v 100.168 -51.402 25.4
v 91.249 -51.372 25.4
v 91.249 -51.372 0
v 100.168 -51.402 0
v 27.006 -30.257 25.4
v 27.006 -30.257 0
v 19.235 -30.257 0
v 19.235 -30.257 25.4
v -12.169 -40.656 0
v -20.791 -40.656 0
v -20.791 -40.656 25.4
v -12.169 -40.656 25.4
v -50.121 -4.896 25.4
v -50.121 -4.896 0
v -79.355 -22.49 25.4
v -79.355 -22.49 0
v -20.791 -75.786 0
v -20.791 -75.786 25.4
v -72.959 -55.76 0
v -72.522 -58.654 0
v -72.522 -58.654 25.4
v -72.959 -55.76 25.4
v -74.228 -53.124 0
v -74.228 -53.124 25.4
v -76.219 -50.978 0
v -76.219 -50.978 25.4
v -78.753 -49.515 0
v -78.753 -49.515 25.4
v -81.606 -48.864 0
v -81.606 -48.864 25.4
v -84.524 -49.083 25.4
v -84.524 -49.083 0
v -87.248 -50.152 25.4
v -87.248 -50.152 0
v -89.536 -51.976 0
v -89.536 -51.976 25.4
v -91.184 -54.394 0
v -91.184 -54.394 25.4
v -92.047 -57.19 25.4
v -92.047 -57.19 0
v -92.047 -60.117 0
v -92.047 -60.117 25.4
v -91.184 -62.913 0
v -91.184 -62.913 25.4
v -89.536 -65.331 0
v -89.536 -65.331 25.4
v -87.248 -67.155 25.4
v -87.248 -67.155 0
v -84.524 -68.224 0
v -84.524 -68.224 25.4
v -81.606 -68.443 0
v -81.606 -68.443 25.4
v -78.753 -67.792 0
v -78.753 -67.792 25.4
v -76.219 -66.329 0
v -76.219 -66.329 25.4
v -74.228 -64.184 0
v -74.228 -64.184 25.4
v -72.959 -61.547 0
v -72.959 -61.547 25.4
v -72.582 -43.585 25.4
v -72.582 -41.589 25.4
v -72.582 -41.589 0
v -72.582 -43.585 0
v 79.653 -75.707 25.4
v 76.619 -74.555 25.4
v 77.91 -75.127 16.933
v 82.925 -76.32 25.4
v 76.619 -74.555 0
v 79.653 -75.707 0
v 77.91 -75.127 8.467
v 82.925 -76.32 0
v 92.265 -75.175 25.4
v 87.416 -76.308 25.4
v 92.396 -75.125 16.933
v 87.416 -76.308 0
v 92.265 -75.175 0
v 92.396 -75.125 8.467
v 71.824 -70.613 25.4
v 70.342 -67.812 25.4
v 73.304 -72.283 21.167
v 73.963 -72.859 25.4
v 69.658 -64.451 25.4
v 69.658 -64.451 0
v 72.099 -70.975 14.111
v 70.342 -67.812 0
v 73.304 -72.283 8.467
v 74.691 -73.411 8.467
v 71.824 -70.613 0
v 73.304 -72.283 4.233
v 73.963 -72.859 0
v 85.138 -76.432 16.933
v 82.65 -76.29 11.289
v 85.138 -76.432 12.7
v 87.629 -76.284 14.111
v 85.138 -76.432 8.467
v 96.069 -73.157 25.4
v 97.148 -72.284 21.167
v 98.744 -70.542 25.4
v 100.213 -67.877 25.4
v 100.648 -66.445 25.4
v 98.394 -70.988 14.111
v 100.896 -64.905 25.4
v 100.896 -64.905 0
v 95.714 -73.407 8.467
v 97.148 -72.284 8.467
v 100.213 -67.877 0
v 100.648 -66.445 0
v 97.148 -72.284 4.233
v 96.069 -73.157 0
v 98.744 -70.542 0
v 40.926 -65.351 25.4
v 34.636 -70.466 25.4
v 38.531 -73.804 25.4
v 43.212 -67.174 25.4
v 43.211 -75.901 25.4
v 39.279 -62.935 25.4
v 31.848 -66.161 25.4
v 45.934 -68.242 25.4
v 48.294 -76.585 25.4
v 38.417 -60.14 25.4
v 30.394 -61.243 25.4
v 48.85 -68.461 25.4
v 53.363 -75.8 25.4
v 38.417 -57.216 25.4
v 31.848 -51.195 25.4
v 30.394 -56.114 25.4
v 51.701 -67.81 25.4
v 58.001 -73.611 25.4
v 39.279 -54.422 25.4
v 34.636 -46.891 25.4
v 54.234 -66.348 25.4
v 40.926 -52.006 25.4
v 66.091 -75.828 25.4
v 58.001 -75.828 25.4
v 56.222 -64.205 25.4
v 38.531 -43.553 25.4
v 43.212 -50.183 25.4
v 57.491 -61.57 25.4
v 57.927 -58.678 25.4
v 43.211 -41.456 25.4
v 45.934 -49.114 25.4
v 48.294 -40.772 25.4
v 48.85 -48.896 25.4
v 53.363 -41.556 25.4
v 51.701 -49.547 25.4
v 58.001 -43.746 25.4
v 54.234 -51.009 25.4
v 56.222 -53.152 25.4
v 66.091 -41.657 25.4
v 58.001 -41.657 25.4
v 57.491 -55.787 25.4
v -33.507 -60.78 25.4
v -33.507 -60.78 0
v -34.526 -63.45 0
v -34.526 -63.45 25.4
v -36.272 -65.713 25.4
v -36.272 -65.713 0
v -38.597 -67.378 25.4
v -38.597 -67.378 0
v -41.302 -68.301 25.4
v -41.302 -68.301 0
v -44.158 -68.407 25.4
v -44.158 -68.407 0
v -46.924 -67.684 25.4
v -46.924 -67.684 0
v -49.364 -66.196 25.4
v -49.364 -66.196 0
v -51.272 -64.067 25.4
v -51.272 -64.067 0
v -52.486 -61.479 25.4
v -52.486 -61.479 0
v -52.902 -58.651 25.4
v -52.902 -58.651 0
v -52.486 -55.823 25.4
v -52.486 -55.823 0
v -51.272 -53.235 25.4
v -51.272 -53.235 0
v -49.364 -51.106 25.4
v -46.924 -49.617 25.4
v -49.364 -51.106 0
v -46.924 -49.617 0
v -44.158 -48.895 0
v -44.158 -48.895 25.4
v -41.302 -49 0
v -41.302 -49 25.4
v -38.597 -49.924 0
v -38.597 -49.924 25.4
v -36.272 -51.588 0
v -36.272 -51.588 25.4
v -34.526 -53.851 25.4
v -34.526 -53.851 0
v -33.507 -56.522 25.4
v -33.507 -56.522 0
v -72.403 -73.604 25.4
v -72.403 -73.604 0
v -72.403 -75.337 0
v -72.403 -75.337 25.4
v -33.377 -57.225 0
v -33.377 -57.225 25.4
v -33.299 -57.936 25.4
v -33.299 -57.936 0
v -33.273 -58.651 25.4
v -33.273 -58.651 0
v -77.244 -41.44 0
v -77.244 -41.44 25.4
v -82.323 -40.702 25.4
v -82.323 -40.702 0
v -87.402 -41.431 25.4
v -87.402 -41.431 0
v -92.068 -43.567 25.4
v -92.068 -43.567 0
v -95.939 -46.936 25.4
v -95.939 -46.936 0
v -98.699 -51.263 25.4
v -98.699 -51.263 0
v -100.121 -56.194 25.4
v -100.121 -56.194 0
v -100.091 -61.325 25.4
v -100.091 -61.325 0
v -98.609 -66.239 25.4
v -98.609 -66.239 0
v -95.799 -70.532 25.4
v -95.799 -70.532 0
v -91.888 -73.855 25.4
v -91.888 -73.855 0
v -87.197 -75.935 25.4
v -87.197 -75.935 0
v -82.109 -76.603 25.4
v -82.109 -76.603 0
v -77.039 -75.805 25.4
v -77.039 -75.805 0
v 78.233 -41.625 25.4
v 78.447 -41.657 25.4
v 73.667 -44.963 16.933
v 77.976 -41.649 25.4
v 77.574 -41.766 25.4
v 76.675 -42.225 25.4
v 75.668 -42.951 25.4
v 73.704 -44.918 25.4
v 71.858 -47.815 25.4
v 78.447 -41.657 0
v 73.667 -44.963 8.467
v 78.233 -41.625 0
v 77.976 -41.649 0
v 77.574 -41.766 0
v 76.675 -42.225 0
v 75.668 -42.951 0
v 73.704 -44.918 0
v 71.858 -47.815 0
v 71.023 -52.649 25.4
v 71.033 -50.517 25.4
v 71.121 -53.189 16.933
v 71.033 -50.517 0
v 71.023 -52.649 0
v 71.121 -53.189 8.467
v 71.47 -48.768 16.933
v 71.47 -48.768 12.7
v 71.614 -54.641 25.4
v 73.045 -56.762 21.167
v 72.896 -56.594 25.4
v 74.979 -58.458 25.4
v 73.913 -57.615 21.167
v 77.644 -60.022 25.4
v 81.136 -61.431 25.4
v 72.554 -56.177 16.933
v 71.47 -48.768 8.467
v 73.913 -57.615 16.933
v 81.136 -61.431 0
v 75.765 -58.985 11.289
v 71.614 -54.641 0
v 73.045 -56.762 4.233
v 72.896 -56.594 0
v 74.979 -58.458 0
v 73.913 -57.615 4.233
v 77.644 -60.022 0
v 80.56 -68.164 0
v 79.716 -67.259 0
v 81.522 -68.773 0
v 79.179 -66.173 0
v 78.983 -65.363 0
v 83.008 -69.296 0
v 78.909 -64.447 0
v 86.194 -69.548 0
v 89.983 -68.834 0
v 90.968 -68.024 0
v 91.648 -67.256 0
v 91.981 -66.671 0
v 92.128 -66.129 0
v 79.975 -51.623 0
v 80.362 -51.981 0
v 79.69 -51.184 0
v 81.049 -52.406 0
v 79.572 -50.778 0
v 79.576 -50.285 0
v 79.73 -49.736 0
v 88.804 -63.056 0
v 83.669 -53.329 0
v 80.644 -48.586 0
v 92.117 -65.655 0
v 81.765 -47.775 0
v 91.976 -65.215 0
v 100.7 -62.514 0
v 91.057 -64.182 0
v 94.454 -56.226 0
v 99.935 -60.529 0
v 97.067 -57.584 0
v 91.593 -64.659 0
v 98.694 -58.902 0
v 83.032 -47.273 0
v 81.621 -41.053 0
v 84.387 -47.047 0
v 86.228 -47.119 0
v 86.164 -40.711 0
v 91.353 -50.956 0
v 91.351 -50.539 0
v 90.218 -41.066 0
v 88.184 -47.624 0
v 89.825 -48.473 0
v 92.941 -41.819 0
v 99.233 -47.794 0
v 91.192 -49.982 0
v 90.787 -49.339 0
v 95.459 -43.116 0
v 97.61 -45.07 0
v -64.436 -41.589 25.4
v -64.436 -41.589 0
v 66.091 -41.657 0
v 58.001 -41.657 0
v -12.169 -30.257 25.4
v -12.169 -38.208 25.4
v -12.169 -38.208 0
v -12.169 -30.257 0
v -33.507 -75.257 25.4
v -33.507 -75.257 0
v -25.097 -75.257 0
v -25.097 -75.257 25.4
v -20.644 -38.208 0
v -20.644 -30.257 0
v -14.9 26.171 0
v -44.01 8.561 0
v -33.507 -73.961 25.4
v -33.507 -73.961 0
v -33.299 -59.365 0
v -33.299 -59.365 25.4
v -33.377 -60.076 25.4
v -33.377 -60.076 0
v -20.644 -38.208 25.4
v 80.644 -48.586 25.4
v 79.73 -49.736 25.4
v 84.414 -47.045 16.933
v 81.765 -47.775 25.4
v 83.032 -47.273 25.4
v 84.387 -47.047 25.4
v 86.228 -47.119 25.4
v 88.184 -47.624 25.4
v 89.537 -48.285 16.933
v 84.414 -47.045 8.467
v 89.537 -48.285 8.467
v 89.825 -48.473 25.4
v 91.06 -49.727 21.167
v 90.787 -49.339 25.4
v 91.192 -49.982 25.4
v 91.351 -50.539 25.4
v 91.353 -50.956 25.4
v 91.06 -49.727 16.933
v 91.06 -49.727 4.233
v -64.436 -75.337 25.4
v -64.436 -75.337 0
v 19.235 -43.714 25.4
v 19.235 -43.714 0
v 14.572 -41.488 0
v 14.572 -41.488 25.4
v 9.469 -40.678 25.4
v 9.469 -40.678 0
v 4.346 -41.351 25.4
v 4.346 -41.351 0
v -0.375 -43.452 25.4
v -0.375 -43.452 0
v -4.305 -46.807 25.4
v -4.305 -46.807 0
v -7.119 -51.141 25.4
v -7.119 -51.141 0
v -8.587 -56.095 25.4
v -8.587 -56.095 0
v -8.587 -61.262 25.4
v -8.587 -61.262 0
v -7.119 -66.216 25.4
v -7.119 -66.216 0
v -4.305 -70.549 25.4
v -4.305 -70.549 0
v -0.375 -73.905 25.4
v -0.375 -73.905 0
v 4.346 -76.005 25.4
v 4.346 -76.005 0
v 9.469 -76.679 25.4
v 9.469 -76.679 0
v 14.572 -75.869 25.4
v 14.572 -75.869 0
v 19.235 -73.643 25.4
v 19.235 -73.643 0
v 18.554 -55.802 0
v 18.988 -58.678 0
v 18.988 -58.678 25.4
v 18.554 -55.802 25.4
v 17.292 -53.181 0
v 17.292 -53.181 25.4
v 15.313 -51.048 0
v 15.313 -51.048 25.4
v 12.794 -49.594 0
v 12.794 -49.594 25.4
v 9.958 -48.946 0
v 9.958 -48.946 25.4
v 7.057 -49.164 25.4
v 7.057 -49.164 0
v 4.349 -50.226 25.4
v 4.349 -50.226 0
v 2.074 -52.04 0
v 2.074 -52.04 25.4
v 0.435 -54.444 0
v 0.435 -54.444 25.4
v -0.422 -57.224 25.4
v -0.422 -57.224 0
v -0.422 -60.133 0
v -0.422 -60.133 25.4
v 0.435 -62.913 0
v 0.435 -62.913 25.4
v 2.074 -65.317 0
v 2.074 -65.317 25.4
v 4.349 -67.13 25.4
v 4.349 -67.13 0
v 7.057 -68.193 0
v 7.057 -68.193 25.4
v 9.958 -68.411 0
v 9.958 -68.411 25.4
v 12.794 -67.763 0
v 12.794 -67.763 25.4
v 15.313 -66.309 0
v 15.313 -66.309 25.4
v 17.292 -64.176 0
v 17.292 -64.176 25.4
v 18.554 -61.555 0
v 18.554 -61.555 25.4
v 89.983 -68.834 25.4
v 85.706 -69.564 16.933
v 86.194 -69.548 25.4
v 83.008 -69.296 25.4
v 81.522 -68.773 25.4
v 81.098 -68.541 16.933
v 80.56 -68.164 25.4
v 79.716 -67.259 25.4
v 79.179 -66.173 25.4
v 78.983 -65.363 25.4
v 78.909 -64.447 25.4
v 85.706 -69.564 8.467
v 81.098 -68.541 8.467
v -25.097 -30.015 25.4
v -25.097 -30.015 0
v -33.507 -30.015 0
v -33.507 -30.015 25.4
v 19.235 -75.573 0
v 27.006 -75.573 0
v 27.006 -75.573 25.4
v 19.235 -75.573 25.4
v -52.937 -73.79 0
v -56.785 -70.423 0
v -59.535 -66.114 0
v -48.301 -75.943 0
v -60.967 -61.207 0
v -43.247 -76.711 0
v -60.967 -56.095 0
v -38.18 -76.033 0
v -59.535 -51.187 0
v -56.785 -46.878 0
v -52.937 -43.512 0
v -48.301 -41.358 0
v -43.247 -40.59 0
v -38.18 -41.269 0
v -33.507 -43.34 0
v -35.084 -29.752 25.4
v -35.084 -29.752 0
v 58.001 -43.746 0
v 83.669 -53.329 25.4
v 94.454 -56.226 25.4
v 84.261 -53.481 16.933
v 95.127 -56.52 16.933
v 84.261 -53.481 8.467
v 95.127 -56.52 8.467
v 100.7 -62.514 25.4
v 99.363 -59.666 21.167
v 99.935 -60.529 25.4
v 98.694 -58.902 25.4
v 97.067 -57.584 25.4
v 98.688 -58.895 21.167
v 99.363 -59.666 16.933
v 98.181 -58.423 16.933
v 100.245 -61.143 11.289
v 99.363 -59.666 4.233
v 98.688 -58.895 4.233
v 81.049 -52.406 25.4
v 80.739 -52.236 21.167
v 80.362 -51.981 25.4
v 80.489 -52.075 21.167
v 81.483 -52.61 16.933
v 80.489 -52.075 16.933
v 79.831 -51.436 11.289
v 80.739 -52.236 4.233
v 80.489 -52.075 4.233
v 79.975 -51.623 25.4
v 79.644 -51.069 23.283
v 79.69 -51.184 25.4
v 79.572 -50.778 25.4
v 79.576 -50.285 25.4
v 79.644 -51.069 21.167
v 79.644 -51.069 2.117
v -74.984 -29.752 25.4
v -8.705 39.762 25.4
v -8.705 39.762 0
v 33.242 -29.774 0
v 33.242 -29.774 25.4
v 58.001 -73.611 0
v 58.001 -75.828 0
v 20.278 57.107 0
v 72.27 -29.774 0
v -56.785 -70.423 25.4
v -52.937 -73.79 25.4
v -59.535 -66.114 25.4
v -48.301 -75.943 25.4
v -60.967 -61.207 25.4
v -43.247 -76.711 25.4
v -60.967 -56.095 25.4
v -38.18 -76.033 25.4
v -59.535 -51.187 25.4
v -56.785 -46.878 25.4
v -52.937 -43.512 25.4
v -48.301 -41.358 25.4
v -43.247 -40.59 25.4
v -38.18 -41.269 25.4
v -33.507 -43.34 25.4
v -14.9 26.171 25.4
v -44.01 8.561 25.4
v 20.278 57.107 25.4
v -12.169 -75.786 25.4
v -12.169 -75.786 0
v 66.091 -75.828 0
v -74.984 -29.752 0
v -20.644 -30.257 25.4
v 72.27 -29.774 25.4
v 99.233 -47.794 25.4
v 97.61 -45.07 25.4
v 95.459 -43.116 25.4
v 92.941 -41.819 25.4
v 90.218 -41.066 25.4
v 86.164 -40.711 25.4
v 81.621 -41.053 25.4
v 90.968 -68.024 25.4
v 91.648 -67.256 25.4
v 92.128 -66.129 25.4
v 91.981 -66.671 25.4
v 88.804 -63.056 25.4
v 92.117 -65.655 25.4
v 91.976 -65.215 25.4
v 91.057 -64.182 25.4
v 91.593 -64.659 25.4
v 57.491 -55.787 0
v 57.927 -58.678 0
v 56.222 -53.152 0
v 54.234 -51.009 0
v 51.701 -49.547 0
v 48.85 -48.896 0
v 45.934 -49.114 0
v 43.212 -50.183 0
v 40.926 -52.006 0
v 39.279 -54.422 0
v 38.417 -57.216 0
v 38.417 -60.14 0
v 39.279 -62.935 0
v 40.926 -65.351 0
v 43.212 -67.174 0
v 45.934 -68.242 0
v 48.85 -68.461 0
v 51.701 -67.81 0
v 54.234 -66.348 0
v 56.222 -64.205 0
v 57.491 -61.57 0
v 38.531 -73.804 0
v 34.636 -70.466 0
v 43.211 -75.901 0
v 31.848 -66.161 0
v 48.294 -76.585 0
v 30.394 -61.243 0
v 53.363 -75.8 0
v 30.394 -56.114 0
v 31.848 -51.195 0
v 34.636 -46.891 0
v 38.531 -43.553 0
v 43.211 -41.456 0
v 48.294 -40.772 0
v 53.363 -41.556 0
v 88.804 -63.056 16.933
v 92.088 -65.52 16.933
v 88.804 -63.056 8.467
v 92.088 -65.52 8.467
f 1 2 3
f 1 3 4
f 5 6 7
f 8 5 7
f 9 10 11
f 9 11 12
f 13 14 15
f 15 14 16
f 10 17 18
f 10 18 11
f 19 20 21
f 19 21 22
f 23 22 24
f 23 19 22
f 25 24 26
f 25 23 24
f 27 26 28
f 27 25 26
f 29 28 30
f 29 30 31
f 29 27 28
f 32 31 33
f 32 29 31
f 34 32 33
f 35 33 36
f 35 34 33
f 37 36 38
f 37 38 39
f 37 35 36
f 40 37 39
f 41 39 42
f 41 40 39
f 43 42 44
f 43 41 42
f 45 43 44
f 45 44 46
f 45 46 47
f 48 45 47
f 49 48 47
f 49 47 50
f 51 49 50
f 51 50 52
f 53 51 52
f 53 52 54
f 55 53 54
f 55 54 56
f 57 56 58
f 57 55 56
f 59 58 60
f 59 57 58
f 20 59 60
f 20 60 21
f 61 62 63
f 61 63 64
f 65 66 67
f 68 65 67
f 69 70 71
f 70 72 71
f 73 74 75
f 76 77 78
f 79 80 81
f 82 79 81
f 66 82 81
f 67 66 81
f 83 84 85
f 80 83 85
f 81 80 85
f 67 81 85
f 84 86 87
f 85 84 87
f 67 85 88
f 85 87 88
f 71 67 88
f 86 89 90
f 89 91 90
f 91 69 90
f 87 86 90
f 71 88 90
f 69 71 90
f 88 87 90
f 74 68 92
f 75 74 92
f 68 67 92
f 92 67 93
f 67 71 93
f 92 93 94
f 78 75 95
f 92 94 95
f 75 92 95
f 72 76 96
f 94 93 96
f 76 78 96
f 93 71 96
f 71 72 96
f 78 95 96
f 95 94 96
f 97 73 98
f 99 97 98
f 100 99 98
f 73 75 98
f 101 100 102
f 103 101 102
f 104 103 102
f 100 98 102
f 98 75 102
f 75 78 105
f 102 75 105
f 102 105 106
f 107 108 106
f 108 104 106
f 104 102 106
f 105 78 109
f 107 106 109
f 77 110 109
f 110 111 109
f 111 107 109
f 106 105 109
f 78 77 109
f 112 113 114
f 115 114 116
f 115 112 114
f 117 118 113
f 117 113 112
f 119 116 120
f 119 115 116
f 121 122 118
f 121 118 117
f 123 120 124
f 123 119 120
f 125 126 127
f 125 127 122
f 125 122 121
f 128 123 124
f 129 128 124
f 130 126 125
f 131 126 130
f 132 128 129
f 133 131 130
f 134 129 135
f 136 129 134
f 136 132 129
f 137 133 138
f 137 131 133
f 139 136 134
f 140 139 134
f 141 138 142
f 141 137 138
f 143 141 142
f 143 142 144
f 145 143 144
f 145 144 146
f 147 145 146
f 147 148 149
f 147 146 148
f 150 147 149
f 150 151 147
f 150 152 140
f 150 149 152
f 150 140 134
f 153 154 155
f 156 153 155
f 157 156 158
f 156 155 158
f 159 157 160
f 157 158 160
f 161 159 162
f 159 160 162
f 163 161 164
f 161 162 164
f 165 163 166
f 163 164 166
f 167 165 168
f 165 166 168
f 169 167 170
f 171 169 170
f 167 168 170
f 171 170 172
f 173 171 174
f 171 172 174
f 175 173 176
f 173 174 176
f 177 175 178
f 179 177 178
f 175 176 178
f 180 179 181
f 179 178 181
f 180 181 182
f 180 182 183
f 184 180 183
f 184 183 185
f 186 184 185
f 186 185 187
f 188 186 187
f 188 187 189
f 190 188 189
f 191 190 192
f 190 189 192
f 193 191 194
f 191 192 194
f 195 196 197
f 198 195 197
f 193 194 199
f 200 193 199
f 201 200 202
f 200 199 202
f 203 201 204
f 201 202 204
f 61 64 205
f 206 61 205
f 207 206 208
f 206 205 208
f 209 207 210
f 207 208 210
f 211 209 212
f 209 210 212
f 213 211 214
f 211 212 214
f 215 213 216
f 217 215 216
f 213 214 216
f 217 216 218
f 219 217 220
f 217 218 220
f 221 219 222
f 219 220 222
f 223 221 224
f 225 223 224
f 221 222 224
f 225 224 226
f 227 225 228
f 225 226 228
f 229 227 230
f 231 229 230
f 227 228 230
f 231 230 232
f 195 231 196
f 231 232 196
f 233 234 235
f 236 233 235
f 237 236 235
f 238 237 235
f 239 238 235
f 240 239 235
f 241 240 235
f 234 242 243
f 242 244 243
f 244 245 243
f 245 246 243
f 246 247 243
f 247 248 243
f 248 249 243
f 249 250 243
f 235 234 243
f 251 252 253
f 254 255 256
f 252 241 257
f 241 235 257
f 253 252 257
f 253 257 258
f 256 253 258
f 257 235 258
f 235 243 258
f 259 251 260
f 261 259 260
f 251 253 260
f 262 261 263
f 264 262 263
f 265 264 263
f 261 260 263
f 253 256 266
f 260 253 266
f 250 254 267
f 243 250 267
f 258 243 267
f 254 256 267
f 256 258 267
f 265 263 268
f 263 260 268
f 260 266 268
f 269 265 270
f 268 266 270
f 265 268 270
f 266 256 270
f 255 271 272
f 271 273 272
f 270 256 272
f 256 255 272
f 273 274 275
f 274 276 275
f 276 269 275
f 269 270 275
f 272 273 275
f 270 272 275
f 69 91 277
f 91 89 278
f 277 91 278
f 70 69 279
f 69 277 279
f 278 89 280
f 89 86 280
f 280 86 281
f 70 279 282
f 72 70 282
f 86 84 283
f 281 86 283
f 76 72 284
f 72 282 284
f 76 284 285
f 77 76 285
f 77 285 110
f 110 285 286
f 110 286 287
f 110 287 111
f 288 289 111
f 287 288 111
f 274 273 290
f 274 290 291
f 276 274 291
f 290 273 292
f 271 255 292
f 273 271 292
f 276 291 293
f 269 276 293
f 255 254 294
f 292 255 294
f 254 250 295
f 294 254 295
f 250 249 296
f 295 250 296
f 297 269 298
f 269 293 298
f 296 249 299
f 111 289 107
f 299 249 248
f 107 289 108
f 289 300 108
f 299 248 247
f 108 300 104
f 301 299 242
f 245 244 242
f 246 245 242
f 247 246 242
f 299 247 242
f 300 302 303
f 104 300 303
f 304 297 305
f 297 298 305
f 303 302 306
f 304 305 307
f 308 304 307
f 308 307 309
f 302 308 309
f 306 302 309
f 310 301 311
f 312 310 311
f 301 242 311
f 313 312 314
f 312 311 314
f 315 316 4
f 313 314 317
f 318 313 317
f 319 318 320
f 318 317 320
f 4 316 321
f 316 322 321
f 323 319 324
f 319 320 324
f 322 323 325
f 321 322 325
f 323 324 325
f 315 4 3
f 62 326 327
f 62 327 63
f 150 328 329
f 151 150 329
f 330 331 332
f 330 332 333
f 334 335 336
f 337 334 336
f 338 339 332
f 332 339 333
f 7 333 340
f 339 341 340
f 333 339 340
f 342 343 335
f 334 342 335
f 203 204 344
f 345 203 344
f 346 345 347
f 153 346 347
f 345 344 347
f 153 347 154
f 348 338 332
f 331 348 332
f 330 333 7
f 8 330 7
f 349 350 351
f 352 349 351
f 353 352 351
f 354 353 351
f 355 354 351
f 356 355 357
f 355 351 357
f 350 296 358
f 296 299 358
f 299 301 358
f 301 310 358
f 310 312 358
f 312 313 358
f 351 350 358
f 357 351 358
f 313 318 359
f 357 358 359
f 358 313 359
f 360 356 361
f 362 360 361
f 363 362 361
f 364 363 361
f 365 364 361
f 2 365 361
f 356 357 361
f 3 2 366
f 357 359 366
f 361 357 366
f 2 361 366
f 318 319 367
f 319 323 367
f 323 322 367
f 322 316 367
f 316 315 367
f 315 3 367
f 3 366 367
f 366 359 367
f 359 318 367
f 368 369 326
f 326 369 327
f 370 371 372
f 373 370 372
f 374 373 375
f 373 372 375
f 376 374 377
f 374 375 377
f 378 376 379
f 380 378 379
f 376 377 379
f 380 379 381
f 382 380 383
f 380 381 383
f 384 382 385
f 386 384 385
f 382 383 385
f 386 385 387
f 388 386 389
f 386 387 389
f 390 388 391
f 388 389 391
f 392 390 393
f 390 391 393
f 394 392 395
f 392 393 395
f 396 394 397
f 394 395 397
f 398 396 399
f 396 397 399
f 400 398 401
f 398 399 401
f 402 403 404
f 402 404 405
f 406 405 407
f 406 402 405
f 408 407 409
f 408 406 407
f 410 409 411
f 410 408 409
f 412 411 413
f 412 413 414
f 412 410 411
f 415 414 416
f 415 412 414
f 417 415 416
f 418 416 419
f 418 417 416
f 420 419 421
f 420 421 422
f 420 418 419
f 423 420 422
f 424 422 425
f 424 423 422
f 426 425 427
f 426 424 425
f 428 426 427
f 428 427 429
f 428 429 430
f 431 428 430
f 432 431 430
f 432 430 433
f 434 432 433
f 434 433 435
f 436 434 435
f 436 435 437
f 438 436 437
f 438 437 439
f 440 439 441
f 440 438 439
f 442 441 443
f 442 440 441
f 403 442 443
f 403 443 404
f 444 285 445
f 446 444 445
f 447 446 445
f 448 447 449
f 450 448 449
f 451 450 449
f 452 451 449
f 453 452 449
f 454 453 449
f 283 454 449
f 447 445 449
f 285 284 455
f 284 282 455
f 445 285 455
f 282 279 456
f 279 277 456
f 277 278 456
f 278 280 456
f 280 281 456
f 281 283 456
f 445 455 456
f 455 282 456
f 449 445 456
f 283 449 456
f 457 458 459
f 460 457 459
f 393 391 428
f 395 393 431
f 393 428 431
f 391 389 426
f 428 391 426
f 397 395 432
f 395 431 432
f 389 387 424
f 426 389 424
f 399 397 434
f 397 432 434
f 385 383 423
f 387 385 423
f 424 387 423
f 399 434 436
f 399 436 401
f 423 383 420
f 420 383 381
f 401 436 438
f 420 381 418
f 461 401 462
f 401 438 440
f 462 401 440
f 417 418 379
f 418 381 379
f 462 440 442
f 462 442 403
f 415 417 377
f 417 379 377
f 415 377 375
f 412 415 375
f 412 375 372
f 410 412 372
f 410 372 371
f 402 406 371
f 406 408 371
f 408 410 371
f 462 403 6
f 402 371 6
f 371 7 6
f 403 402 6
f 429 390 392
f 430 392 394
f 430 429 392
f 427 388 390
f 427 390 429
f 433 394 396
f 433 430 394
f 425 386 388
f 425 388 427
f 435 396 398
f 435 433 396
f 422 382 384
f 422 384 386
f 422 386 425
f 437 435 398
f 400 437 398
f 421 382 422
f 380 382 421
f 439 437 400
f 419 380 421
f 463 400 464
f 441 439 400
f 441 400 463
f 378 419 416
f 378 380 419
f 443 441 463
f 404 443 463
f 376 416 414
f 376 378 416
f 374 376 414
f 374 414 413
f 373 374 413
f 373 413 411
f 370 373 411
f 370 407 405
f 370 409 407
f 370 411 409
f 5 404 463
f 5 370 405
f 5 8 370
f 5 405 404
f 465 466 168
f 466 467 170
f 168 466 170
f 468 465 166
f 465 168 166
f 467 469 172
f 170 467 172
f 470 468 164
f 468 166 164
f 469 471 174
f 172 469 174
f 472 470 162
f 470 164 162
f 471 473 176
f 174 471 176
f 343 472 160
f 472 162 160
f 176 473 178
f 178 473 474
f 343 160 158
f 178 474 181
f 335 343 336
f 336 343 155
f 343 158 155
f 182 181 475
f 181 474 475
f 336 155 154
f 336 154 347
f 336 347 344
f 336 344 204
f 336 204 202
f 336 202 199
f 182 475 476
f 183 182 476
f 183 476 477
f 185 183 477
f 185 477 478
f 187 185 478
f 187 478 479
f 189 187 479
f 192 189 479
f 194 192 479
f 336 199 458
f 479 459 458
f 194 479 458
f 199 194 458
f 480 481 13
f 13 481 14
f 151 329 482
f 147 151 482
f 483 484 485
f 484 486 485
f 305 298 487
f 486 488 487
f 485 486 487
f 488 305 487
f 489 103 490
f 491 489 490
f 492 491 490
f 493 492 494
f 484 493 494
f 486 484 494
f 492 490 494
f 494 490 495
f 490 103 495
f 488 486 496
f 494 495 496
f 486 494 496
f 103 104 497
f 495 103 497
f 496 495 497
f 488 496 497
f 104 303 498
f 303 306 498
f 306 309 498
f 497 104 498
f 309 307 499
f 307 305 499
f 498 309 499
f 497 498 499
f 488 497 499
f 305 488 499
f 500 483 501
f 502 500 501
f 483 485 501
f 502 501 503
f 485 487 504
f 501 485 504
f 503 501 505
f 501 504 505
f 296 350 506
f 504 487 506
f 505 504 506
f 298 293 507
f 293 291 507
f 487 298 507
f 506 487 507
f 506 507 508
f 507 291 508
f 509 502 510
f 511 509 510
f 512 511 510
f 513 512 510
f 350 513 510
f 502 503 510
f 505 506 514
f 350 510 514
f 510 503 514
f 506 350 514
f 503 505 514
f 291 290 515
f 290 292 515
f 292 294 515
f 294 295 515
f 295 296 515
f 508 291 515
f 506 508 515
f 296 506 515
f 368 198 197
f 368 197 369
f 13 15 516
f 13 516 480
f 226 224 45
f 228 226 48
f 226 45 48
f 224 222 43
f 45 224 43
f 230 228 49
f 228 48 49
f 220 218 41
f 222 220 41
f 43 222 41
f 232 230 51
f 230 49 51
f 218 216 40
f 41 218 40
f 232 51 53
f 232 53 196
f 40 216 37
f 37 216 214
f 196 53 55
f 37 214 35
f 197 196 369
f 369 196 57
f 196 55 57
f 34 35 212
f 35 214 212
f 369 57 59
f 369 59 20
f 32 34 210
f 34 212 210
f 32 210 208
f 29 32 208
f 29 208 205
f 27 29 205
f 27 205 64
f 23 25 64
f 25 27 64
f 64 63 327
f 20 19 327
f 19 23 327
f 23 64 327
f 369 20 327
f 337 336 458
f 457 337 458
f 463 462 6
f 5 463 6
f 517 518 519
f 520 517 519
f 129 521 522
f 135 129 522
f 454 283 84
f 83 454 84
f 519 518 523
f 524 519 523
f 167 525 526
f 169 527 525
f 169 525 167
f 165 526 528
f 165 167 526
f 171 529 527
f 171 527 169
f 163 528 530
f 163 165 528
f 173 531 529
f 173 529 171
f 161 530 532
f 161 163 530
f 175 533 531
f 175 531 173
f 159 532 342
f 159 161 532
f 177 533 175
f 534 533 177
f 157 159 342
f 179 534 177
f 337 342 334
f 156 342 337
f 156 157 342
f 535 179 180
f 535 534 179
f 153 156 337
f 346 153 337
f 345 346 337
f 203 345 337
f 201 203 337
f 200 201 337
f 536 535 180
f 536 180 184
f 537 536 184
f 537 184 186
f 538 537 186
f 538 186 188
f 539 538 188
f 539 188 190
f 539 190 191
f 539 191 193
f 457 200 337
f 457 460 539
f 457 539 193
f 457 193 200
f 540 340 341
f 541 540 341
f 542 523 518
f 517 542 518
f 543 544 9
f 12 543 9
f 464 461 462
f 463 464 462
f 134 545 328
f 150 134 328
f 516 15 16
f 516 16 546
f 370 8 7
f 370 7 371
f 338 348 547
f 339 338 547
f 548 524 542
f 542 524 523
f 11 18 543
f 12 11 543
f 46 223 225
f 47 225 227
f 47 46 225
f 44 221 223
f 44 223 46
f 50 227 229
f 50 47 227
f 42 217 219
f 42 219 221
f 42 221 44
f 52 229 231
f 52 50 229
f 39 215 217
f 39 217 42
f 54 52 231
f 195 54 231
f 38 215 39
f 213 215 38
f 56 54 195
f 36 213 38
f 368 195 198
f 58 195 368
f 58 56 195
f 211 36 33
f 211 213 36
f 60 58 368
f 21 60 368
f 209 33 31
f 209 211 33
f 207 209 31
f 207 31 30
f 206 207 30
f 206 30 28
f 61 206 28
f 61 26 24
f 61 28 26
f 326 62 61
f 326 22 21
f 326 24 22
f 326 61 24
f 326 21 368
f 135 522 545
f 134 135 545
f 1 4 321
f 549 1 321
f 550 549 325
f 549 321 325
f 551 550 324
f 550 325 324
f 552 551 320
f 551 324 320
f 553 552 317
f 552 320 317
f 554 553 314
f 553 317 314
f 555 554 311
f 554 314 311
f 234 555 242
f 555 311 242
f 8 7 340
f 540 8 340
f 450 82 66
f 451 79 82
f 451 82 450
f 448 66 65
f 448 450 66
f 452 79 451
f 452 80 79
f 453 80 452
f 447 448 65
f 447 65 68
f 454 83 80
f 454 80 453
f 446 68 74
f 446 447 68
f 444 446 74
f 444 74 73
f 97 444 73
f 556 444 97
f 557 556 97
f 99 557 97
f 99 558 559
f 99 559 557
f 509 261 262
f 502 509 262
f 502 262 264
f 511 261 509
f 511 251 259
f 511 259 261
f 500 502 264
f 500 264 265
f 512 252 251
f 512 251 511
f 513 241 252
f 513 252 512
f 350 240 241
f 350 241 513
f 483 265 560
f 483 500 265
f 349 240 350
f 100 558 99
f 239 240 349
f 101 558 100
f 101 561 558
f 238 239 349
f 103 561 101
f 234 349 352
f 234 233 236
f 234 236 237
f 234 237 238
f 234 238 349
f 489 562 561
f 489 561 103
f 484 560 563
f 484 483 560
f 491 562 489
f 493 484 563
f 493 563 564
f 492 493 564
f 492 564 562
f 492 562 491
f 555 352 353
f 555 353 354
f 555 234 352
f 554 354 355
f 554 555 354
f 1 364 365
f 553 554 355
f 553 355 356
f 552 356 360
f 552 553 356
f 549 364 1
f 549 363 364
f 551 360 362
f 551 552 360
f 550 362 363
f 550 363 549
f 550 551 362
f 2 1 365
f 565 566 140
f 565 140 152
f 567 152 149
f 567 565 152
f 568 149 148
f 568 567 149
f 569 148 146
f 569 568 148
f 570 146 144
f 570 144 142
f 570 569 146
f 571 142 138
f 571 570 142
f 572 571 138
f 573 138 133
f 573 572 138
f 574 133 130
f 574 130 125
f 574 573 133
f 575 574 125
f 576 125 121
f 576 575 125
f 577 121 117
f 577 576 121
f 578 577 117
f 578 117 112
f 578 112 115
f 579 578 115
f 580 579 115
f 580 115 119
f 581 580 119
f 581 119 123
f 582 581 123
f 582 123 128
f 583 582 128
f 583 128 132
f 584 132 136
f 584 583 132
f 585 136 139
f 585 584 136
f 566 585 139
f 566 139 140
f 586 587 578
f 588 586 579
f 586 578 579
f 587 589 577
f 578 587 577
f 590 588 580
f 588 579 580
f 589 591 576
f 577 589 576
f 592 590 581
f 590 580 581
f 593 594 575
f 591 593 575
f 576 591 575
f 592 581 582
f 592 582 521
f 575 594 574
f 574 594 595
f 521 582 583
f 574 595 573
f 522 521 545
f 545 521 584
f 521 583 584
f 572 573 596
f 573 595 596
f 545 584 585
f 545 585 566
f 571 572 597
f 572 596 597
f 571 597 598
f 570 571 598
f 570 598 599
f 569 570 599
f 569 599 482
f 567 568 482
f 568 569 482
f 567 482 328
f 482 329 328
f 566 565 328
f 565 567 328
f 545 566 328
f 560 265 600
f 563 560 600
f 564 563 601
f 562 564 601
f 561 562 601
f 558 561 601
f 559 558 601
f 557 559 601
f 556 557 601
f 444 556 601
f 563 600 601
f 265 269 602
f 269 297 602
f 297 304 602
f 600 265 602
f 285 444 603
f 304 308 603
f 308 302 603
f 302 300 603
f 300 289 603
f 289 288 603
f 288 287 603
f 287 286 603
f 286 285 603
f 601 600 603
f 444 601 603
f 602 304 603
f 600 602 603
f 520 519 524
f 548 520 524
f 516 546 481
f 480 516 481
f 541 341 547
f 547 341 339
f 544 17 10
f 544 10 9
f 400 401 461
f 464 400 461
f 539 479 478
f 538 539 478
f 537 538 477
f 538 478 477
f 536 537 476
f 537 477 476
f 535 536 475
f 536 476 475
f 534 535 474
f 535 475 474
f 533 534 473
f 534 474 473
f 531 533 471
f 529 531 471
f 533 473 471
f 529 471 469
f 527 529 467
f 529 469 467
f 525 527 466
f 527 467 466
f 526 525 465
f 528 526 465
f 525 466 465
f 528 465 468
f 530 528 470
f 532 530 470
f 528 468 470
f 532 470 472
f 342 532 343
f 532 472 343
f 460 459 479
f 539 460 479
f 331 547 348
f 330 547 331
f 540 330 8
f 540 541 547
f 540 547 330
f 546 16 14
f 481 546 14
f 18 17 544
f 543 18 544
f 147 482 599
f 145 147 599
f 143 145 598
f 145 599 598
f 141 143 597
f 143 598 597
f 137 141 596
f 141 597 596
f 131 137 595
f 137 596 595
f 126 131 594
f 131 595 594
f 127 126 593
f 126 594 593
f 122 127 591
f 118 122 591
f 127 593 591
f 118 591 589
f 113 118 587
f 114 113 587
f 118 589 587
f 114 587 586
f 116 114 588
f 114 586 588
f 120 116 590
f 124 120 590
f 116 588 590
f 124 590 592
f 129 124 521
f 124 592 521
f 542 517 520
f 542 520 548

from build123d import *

# Parameters (mm, degrees)
F0_R     = 9.8168583777
F1_DEPTH = 25.4
F0_W     = 8.6227245629
F0_H     = 35.1296216249
F0_W_2   = 8.4749514465
F0_H_2   = 7.9514212463
F0_R_2   = 9.7595146702
F0_R_3   = 9.8100166277


with BuildPart() as f1:
    # F0 (on Top) → F1 (new body)
    with BuildSketch(Plane.XY):
        with BuildLine():
            ThreePointArc((-64.4362494349, -57.3380434245), (-66.8940964115, -49.5050308039), (-72.5822299719, -43.5853825816))
            ThreePointArc((-72.5822299719, -43.5853825816), (-100.2904067139, -58.7606290674), (-72.4031999707, -73.6043100237))
            ThreePointArc((-72.4031999707, -73.6043100237), (-66.8398110404, -67.709835531), (-64.4362494349, -59.9690979987))
            Line((-64.4362494349, -59.9690979987), (-64.4362494349, -57.3380434245))
        make_face()
        with Locations((-82.3393538594, -58.6535707116)):
            Circle(F0_R, mode=Mode.SUBTRACT)
        with BuildLine():
            Line((-72.5822299719, -41.5889546275), (-72.5822299719, -43.5853825816))
            ThreePointArc((-72.5822299719, -43.5853825816), (-66.8940964115, -49.5050308039), (-64.4362494349, -57.3380434245))
            Line((-64.4362494349, -57.3380434245), (-64.4362494349, -41.5889546275))
            Line((-64.4362494349, -41.5889546275), (-72.5822299719, -41.5889546275))
        make_face()
        with BuildLine():
            ThreePointArc((-64.4362494349, -59.9690979987), (-66.8398110404, -67.709835531), (-72.4031999707, -73.6043100237))
            Line((-72.4031999707, -73.6043100237), (-72.4031999707, -75.3365829587))
            Line((-72.4031999707, -75.3365829587), (-64.4362494349, -75.3365829587))
            Line((-64.4362494349, -75.3365829587), (-64.4362494349, -59.9690979987))
        make_face()
    extrude(amount=F1_DEPTH)


with BuildPart() as f1b:
    # F0 (on Top) → F1, piece 2 (new body)
    with BuildSketch(Plane.XY):
        with BuildLine():
            ThreePointArc((-33.5065610707, -60.7797522098), (-52.9018863457, -58.6506798863), (-33.5065610707, -56.5216075629))
            Line((-33.5065610707, -56.5216075629), (-33.5065610707, -43.33988514))
            ThreePointArc((-33.5065610707, -43.33988514), (-61.1487145763, -58.6506798863), (-33.5065610707, -73.9614746327))
            Line((-33.5065610707, -73.9614746327), (-33.5065610707, -60.7797522098))
        make_face()
        with BuildLine():
            ThreePointArc((-33.5065610707, -56.5216075629), (-33.3314509237, -57.5797491056), (-33.2728475911, -58.6506798863))
            ThreePointArc((-33.2728475911, -58.6506798863), (-33.3314509237, -59.7216106671), (-33.5065610707, -60.7797522098))
            Line((-33.5065610707, -60.7797522098), (-33.5065610707, -73.9614746327))
            ThreePointArc((-33.5065610707, -73.9614746327), (-27.6904736277, -68.0924992486), (-25.0967442989, -60.2474808693))
            Line((-25.0967442989, -60.2474808693), (-25.0967442989, -57.0538789034))
            ThreePointArc((-25.0967442989, -57.0538789034), (-27.6904736277, -49.2088605241), (-33.5065610707, -43.33988514))
            Line((-33.5065610707, -43.33988514), (-33.5065610707, -56.5216075629))
        make_face()
        with BuildLine():
            Line((-33.5065610707, -30.0147216767), (-33.5065610707, -43.33988514))
            ThreePointArc((-33.5065610707, -43.33988514), (-27.6904736277, -49.2088605241), (-25.0967442989, -57.0538789034))
            Line((-25.0967442989, -57.0538789034), (-25.0967442989, -30.0147216767))
            Line((-25.0967442989, -30.0147216767), (-33.5065610707, -30.0147216767))
        make_face()
        with BuildLine():
            ThreePointArc((-25.0967442989, -60.2474808693), (-27.6904736277, -68.0924992486), (-33.5065610707, -73.9614746327))
            Line((-33.5065610707, -73.9614746327), (-33.5065610707, -75.2574056387))
            Line((-33.5065610707, -75.2574056387), (-25.0967442989, -75.2574056387))
            Line((-25.0967442989, -75.2574056387), (-25.0967442989, -60.2474808693))
        make_face()
    extrude(amount=F1_DEPTH)


with BuildPart() as f1c:
    # F0 (on Top) → F1, piece 3 (new body)
    with BuildSketch(Plane.XY):
        with Locations((-16.4800006896, -58.2212135196)):
            Rectangle(F0_W, F0_H)
    extrude(amount=F1_DEPTH)


with BuildPart() as f1d:
    # F0 (on Top) → F1, piece 4 (new body)
    with BuildSketch(Plane.XY):
        with Locations((-16.4061141315, -34.232267387)):
            Rectangle(F0_W_2, F0_H_2)
        Polygon((-14.9002628893, 26.1708135426), (-44.0099721158, 8.5610841344), (-20.6435898547, -30.2565567639), (-12.1686384082, -30.2565567639), (19.2351080477, -30.2565567639), align=None)
    extrude(amount=F1_DEPTH)


with BuildPart() as f1e:
    # F0 (on Top) → F1, piece 5 (new body)
    with BuildSketch(Plane.XY):
        with BuildLine():
            Line((19.2351080477, -73.6428715184), (19.2351080477, -43.7139131233))
            ThreePointArc((19.2351080477, -43.7139131233), (-8.7733980627, -58.6783923209), (19.2351080477, -73.6428715184))
        make_face()
        with Locations((9.2284912243, -58.6783923209)):
            Circle(F0_R_2, mode=Mode.SUBTRACT)
        with BuildLine():
            ThreePointArc((27.0062051713, -55.8462721394), (24.3873431899, -48.9687463443), (19.2351080477, -43.7139131233))
            Line((19.2351080477, -43.7139131233), (19.2351080477, -73.6428715184))
            ThreePointArc((19.2351080477, -73.6428715184), (24.3873431899, -68.3880382974), (27.0062051713, -61.5105125023))
            Line((27.0062051713, -61.5105125023), (27.0062051713, -55.8462721394))
        make_face()
        with BuildLine():
            Line((27.0062051713, -30.2565567639), (19.2351080477, -30.2565567639))
            Line((19.2351080477, -30.2565567639), (19.2351080477, -43.7139131233))
            ThreePointArc((19.2351080477, -43.7139131233), (24.3873431899, -48.9687463443), (27.0062051713, -55.8462721394))
            Line((27.0062051713, -55.8462721394), (27.0062051713, -30.2565567639))
        make_face()
        with BuildLine():
            ThreePointArc((27.0062051713, -61.5105125023), (24.3873431899, -68.3880382974), (19.2351080477, -73.6428715184))
            Line((19.2351080477, -73.6428715184), (19.2351080477, -75.5731165409))
            Line((19.2351080477, -75.5731165409), (27.0062051713, -75.5731165409))
            Line((27.0062051713, -75.5731165409), (27.0062051713, -61.5105125023))
        make_face()
    extrude(amount=F1_DEPTH)


with BuildPart() as f1f:
    # F0 (on Top) → F1, piece 6 (new body)
    with BuildSketch(Plane.XY):
        with BuildLine():
            Line((58.0009706318, -73.6112598492), (58.0009706318, -43.7455247925))
            ThreePointArc((58.0009706318, -43.7455247925), (30.2094695434, -58.6783923209), (58.0009706318, -73.6112598492))
        make_face()
        with Locations((48.1170676649, -58.6783923209)):
            Circle(F0_R_3, mode=Mode.SUBTRACT)
        with BuildLine():
            ThreePointArc((58.0009706318, -73.6112598492), (63.891715564, -67.1543910312), (66.0246657863, -58.6783923209))
            ThreePointArc((66.0246657863, -58.6783923209), (63.891715564, -50.2023936105), (58.0009706318, -43.7455247925))
            Line((58.0009706318, -43.7455247925), (58.0009706318, -73.6112598492))
        make_face()
        with BuildLine():
            ThreePointArc((58.0009706318, -43.7455247925), (63.891715564, -50.2023936105), (66.0246657863, -58.6783923209))
            ThreePointArc((66.0246657863, -58.6783923209), (63.891715564, -67.1543910312), (58.0009706318, -73.6112598492))
            Line((58.0009706318, -73.6112598492), (58.0009706318, -75.8280828595))
            Line((58.0009706318, -75.8280828595), (66.0914257169, -75.8280828595))
            Line((66.0914257169, -75.8280828595), (66.0914257169, -41.65655002))
            Line((66.0914257169, -41.65655002), (58.0009706318, -41.65655002))
            Line((58.0009706318, -41.65655002), (58.0009706318, -43.7455247925))
        make_face()
    extrude(amount=F1_DEPTH)


with BuildPart() as f1g:
    # F0 (on Top) → F1, piece 7 (new body)
    with BuildSketch(Plane.XY):
        with BuildLine():
            Line((78.9085254073, -64.4467994571), (69.6576759219, -64.4508749247))
            add(Edge.make_bspline(
                [(69.6576759219, -64.4508749247), (70.7202628255, -80.6176885962), (99.462673068, -80.0826251507), (100.8963435888, -64.9048909545)],
                knots=[0, 0, 0, 0, 31.241966778, 31.241966778, 31.241966778, 31.241966778], degree=3))
            add(Edge.make_bspline(
                [(100.8963435888, -64.9048909545), (101.4852896333, -51.8313832581), (77.2842392325, -55.8495000005), (79.7297279685, -49.7361972484)],
                knots=[0, 0, 0, 0, 26.040639116, 26.040639116, 26.040639116, 26.040639116], degree=3))
            add(Edge.make_bspline(
                [(79.7297279685, -49.7361972484), (82.9119309783, -44.3855635822), (92.5262793899, -48.0547174811), (91.2488400936, -51.3720996678)],
                knots=[0, 0, 0, 0, 11.634694705, 11.634694705, 11.634694705, 11.634694705], degree=3))
            Line((91.2488400936, -51.3720996678), (100.1684612964, -51.4017923224))
            add(Edge.make_bspline(
                [(100.1684612964, -51.4017923224), (98.2065796852, -36.4769659936), (77.8510241745, -41.8477672392), (78.575745225, -41.65655002), (78.4465968609, -41.65655002)],
                knots=[0, 0, 0, 0, 0.9312417891, 1, 1, 1, 1], degree=3))
            add(Edge.make_bspline(
                [(78.4465968609, -41.65655002), (75.9927406907, -40.8680737019), (61.3987632096, -54.8162981868), (81.1362018826, -61.4309588563)],
                knots=[0, 0, 0, 0, 19.956483157, 19.956483157, 19.956483157, 19.956483157], degree=3))
            add(Edge.make_bspline(
                [(81.1362018826, -61.4309588563), (90.6611979008, -62.6386923625), (95.1168835163, -65.092548728), (89.9830050553, -68.8343461351)],
                knots=[0, 0, 0, 0, 11.5358601577, 11.5358601577, 11.5358601577, 11.5358601577], degree=3))
            add(Edge.make_bspline(
                [(89.9830050553, -68.8343461351), (86.7866948247, -70.0002610683), (78.9731070399, -70.5168619752), (78.9085254073, -64.4467994571)],
                knots=[0, 0, 0, 0, 11.9119547231, 11.9119547231, 11.9119547231, 11.9119547231], degree=3))
        make_face()
    extrude(amount=F1_DEPTH)


with BuildPart() as f1h:
    # F0 (on Top) → F1, piece 8 (new body)
    with BuildSketch(Plane.XY):
        Polygon((20.2781427652, 57.1066960692), (-8.7053831667, 39.7621840239), (33.2418940961, -29.7743845731), (72.2700899582, -29.7743845731), align=None)
    extrude(amount=F1_DEPTH)


with BuildPart() as f1i:
    # F0 (on Top) → F1, piece 9 (new body)
    with BuildSketch(Plane.XY):
        Polygon((-50.1212775707, -4.8962952569), (-79.3546124484, -22.4902936408), (-74.9839549715, -29.7523662448), (-74.2651075125, -29.7523662448), (-73.7612769008, -29.7523662448), (-35.0841917098, -29.7523662448), align=None)
    extrude(amount=F1_DEPTH)


solid = Compound([f1.part, f1b.part, f1c.part, f1d.part, f1e.part, f1f.part, f1g.part, f1h.part, f1i.part])
